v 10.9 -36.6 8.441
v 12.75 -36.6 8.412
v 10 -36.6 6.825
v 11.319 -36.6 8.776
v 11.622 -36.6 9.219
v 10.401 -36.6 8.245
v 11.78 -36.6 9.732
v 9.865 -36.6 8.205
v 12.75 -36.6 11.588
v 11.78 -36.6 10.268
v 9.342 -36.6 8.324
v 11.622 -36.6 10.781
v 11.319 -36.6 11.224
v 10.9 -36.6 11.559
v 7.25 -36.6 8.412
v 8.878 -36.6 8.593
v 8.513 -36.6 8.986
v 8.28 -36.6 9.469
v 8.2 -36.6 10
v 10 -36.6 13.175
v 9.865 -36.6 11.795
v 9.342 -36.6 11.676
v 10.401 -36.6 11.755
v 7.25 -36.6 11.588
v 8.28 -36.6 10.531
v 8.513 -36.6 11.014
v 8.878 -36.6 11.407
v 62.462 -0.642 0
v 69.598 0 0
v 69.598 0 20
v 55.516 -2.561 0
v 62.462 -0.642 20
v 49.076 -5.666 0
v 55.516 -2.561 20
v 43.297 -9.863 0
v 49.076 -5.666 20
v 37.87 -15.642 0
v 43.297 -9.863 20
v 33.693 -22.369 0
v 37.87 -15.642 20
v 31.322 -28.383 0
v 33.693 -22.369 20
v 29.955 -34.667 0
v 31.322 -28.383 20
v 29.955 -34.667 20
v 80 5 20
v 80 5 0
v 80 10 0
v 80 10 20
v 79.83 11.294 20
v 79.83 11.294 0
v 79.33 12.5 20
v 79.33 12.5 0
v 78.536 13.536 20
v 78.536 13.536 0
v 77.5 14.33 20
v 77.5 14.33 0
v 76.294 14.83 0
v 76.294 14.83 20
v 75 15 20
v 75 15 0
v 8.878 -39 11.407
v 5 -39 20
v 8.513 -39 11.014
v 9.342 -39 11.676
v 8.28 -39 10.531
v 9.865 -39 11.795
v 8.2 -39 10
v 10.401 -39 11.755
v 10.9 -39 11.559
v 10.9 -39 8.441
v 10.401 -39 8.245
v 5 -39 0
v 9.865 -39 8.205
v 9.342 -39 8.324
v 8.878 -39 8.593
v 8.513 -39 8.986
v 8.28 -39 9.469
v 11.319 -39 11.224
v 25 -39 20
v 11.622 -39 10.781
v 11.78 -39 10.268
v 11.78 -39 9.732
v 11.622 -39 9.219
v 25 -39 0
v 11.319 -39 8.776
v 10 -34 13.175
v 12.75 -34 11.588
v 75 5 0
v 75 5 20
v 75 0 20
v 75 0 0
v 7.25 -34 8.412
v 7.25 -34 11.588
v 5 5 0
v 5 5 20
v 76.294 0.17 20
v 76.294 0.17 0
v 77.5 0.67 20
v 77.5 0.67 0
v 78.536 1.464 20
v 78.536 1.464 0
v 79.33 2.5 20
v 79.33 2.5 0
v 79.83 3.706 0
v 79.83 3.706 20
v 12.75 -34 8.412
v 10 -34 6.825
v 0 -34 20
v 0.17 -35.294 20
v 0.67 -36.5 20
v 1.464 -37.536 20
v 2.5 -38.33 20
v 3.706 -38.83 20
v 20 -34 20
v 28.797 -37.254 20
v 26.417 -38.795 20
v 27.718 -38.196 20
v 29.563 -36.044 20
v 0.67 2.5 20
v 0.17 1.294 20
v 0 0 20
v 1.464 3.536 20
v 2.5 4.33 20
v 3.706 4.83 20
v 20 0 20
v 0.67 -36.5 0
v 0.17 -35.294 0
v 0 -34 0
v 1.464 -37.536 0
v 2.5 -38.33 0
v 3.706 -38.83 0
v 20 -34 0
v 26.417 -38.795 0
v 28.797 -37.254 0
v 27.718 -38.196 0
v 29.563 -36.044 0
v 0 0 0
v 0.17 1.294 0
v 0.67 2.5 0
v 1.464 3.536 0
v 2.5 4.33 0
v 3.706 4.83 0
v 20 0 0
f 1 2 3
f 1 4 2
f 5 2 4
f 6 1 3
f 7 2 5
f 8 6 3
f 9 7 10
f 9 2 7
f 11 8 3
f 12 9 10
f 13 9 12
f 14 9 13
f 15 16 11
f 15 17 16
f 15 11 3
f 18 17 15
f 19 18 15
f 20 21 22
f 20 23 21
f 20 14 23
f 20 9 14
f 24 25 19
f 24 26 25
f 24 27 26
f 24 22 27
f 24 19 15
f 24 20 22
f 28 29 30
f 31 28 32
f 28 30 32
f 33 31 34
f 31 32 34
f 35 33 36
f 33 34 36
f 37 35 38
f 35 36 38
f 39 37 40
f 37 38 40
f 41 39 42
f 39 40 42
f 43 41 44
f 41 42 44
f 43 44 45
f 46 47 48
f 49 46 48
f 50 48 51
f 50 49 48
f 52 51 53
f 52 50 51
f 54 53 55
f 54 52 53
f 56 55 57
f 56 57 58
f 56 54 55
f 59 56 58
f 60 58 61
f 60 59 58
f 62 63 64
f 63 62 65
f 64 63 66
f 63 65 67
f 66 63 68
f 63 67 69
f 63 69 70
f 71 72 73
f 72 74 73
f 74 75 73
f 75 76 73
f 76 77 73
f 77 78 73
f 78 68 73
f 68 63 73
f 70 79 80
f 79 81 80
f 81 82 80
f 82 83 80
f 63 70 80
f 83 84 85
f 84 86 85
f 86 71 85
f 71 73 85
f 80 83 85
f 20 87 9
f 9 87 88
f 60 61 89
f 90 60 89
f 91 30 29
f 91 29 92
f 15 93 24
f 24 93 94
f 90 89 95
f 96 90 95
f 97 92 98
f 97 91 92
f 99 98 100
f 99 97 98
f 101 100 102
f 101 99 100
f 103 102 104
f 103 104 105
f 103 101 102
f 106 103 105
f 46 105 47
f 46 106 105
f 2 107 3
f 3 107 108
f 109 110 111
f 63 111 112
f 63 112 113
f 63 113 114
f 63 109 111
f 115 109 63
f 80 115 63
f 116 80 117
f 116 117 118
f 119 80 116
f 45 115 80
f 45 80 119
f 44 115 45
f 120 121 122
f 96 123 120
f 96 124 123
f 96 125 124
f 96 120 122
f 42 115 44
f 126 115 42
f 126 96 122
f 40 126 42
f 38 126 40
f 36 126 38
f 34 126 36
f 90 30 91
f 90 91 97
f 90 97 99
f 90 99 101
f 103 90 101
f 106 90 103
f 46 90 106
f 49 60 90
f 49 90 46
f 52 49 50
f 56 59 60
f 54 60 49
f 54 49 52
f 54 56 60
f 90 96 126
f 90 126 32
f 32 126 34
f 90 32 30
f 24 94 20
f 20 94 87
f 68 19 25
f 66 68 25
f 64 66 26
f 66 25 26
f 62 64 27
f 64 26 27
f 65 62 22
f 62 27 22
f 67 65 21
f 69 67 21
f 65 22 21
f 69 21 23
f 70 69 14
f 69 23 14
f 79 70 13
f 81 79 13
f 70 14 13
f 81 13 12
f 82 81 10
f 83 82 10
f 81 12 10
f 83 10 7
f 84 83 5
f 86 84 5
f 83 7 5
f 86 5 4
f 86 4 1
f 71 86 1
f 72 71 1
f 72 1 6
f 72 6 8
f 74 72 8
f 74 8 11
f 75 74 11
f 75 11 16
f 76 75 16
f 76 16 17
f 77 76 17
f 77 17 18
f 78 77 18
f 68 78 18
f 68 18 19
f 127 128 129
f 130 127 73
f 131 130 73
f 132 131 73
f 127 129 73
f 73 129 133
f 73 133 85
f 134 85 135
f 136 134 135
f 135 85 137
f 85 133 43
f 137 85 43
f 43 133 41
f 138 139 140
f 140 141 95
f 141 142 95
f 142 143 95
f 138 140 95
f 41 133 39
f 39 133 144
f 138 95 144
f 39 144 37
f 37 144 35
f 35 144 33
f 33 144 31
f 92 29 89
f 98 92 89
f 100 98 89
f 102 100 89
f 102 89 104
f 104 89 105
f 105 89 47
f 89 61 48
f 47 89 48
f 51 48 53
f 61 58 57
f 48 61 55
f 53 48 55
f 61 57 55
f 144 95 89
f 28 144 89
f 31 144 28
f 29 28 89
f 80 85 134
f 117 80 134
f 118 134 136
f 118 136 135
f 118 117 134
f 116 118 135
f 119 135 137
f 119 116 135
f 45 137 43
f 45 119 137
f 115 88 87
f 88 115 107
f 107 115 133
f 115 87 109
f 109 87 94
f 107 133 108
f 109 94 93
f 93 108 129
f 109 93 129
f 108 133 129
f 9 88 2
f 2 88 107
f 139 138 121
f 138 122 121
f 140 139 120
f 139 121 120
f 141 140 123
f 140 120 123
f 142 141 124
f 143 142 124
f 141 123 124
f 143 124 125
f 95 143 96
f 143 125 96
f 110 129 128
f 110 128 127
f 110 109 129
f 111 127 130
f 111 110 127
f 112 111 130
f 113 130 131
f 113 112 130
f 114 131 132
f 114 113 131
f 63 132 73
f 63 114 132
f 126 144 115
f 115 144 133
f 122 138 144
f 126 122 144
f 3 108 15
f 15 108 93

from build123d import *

# Parameters (mm, degrees)
F3_DEPTH = 20
F4_R     = 4.99999
F6_DEPTH = 2.6
F7_D     = 3.6
F7_DEPTH = 10
F7_TIP   = 1.0815491142
F8_R     = 40


# Not quite as in the source:
# - a fillet or chamfer is up to 0.001 mm smaller than in the source, because OpenCascade refuses the exact size


with BuildPart() as f3:
    # F2 (on Top) → F3 (new body)
    with BuildSketch(Plane.XY):
        Polygon((0, 5), (0, 0), (20, 0), (20, -34), (0, -34), (0, -39), (30, -39), (30, 0), (80, 0), (80, 15), (75, 15), (75, 5), align=None)
    extrude(amount=F3_DEPTH)

    # F4 (radius 5 in the source; OpenCascade refuses exactly that, so slightly less here)
    f4_edges = [f3.edges().sort_by_distance(p)[0] for p in [
        (30, -39, 10),
        (80, 0, 10),
        (80, 15, 10),
        (0, 5, 10),
        (0, -39, 10),
    ]]
    fillet(f4_edges, radius=F4_R)

    # F5 (on face) → F6 (cut)
    with BuildSketch(Plane(origin=(0, -34, 0), x_dir=(-1, 0, 0), z_dir=(0, 1, 0))):
        Polygon((-7.25, 8.4122867597), (-7.25, 11.5877132403), (-10, 13.1754264805), (-12.75, 11.5877132403), (-12.75, 8.4122867597), (-10, 6.8245735195), align=None)
    extrude(amount=-F6_DEPTH, mode=Mode.SUBTRACT)

    # F7 (one way)
    with BuildSketch(Plane(origin=(0, -34, 0), x_dir=(-1, 0, 0), z_dir=(0, 1, 0))):
        with Locations((-10, 10)):
            Circle(F7_D / 2)
    extrude(amount=-F7_DEPTH, mode=Mode.SUBTRACT)
    with Locations(Plane(origin=(0, -34, 0), x_dir=(-1, 0, 0), z_dir=(0, 1, 0))):
        with Locations((-10, 10)):
            with Locations((0, 0, -(F7_DEPTH + F7_TIP / 2))):  # 118° drill point
                Cone(0, F7_D / 2, F7_TIP, mode=Mode.SUBTRACT)

    # F8
    f8_edges = [f3.edges().sort_by_distance(p)[0] for p in [
        (30, 0, 10),
    ]]
    fillet(f8_edges, radius=F8_R)


solid = f3.part
